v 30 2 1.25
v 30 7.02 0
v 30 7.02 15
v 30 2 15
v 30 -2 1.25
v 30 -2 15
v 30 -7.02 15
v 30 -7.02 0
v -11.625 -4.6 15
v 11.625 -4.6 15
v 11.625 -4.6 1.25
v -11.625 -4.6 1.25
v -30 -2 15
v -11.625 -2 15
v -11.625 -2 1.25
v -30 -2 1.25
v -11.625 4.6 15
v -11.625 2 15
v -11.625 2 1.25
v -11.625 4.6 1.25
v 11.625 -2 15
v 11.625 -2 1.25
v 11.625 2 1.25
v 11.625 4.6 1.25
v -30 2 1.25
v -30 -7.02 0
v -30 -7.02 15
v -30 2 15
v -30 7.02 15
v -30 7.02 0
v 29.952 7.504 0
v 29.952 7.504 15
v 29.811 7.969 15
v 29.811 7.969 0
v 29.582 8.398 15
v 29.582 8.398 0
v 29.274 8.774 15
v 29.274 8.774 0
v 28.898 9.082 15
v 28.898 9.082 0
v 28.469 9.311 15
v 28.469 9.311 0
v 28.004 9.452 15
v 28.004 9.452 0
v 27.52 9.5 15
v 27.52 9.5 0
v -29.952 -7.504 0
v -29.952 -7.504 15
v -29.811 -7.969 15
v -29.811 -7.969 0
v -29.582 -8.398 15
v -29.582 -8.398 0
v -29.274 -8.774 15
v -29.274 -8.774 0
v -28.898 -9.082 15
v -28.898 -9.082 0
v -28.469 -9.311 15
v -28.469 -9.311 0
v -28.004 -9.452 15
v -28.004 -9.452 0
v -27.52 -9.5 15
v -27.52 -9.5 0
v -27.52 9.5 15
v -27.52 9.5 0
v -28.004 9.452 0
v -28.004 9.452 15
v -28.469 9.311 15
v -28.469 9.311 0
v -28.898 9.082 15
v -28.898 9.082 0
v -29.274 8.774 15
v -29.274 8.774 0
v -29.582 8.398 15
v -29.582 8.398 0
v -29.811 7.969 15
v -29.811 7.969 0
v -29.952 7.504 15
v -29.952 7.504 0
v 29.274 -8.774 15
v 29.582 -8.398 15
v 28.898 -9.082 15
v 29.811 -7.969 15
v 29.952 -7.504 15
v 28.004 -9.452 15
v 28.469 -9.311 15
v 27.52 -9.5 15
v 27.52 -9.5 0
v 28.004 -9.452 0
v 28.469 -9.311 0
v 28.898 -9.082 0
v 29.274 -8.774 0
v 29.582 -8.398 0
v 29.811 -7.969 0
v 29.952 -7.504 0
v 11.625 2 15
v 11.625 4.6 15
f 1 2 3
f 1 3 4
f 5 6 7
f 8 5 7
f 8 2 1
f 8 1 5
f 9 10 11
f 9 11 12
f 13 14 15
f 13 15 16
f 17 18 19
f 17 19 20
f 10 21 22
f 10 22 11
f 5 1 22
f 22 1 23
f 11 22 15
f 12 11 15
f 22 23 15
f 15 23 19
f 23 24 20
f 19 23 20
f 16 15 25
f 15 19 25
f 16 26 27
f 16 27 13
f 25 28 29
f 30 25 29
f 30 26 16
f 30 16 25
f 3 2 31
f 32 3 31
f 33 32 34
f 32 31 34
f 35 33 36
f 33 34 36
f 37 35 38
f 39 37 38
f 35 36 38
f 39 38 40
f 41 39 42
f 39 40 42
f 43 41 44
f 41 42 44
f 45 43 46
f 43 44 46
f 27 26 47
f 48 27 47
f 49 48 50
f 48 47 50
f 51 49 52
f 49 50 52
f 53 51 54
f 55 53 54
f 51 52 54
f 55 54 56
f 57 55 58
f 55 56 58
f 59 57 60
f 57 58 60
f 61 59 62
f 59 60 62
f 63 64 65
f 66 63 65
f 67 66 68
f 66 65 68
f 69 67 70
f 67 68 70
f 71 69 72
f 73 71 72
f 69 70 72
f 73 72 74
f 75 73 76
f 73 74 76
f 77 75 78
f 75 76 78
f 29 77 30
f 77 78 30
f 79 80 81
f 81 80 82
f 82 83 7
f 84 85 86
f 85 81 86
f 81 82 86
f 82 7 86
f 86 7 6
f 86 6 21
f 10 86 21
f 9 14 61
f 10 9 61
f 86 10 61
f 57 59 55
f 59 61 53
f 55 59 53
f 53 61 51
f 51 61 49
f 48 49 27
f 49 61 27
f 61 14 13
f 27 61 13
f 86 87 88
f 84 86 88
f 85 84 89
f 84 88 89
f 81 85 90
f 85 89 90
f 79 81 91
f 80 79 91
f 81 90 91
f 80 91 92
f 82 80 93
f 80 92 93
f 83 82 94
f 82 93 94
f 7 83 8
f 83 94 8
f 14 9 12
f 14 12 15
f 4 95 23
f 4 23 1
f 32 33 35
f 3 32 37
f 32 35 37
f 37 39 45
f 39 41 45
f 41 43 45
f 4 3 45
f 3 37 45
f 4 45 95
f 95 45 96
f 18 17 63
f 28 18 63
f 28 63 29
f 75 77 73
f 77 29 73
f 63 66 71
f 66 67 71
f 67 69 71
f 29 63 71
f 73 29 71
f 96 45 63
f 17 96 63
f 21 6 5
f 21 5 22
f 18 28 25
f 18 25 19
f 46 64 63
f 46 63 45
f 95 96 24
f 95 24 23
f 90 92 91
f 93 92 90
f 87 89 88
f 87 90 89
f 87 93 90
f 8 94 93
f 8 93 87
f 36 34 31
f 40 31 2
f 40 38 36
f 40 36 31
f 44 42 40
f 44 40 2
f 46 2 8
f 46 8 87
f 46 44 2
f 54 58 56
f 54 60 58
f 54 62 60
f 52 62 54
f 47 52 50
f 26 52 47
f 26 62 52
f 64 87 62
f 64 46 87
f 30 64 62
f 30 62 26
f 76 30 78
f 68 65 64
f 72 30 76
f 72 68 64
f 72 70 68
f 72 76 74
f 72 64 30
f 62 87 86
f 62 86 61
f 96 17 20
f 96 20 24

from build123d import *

# Parameters (mm, degrees)
PAD_DEPTH    = 15
POCKET_DEPTH = 13.75


with BuildPart() as part:
    # Sketch → Pad (new body)
    with BuildSketch(Plane.XY):
        with BuildLine():
            Line((-27.52, 9.5), (27.52, 9.5))
            ThreePointArc((30, 7.02), (29.273625, 8.773625), (27.52, 9.5))
            Line((30, 7.02), (30, -7.02))
            ThreePointArc((27.52, -9.5), (29.273625, -8.773625), (30, -7.02))
            Line((27.52, -9.5), (-27.52, -9.5))
            ThreePointArc((-30, -7.02), (-29.273625, -8.773625), (-27.52, -9.5))
            Line((-30, -7.02), (-30, 7.02))
            ThreePointArc((-27.52, 9.5), (-29.273625, 8.773625), (-30, 7.02))
        make_face()
    extrude(amount=PAD_DEPTH)

    # Sketch001 (on Face10 of Pad) → Pocket (cut)
    with BuildSketch(Plane.XY.offset(15)):
        Polygon((-30.255, 2), (-11.625, 2), (-11.625, 4.6), (11.625, 4.6), (11.625, 2), (30.255, 2), (30.255, -2), (11.625, -2), (11.625, -4.6), (-11.625, -4.6), (-11.625, -2), (-30.255, -2), align=None)
    extrude(amount=-POCKET_DEPTH, mode=Mode.SUBTRACT)


solid = part.part
